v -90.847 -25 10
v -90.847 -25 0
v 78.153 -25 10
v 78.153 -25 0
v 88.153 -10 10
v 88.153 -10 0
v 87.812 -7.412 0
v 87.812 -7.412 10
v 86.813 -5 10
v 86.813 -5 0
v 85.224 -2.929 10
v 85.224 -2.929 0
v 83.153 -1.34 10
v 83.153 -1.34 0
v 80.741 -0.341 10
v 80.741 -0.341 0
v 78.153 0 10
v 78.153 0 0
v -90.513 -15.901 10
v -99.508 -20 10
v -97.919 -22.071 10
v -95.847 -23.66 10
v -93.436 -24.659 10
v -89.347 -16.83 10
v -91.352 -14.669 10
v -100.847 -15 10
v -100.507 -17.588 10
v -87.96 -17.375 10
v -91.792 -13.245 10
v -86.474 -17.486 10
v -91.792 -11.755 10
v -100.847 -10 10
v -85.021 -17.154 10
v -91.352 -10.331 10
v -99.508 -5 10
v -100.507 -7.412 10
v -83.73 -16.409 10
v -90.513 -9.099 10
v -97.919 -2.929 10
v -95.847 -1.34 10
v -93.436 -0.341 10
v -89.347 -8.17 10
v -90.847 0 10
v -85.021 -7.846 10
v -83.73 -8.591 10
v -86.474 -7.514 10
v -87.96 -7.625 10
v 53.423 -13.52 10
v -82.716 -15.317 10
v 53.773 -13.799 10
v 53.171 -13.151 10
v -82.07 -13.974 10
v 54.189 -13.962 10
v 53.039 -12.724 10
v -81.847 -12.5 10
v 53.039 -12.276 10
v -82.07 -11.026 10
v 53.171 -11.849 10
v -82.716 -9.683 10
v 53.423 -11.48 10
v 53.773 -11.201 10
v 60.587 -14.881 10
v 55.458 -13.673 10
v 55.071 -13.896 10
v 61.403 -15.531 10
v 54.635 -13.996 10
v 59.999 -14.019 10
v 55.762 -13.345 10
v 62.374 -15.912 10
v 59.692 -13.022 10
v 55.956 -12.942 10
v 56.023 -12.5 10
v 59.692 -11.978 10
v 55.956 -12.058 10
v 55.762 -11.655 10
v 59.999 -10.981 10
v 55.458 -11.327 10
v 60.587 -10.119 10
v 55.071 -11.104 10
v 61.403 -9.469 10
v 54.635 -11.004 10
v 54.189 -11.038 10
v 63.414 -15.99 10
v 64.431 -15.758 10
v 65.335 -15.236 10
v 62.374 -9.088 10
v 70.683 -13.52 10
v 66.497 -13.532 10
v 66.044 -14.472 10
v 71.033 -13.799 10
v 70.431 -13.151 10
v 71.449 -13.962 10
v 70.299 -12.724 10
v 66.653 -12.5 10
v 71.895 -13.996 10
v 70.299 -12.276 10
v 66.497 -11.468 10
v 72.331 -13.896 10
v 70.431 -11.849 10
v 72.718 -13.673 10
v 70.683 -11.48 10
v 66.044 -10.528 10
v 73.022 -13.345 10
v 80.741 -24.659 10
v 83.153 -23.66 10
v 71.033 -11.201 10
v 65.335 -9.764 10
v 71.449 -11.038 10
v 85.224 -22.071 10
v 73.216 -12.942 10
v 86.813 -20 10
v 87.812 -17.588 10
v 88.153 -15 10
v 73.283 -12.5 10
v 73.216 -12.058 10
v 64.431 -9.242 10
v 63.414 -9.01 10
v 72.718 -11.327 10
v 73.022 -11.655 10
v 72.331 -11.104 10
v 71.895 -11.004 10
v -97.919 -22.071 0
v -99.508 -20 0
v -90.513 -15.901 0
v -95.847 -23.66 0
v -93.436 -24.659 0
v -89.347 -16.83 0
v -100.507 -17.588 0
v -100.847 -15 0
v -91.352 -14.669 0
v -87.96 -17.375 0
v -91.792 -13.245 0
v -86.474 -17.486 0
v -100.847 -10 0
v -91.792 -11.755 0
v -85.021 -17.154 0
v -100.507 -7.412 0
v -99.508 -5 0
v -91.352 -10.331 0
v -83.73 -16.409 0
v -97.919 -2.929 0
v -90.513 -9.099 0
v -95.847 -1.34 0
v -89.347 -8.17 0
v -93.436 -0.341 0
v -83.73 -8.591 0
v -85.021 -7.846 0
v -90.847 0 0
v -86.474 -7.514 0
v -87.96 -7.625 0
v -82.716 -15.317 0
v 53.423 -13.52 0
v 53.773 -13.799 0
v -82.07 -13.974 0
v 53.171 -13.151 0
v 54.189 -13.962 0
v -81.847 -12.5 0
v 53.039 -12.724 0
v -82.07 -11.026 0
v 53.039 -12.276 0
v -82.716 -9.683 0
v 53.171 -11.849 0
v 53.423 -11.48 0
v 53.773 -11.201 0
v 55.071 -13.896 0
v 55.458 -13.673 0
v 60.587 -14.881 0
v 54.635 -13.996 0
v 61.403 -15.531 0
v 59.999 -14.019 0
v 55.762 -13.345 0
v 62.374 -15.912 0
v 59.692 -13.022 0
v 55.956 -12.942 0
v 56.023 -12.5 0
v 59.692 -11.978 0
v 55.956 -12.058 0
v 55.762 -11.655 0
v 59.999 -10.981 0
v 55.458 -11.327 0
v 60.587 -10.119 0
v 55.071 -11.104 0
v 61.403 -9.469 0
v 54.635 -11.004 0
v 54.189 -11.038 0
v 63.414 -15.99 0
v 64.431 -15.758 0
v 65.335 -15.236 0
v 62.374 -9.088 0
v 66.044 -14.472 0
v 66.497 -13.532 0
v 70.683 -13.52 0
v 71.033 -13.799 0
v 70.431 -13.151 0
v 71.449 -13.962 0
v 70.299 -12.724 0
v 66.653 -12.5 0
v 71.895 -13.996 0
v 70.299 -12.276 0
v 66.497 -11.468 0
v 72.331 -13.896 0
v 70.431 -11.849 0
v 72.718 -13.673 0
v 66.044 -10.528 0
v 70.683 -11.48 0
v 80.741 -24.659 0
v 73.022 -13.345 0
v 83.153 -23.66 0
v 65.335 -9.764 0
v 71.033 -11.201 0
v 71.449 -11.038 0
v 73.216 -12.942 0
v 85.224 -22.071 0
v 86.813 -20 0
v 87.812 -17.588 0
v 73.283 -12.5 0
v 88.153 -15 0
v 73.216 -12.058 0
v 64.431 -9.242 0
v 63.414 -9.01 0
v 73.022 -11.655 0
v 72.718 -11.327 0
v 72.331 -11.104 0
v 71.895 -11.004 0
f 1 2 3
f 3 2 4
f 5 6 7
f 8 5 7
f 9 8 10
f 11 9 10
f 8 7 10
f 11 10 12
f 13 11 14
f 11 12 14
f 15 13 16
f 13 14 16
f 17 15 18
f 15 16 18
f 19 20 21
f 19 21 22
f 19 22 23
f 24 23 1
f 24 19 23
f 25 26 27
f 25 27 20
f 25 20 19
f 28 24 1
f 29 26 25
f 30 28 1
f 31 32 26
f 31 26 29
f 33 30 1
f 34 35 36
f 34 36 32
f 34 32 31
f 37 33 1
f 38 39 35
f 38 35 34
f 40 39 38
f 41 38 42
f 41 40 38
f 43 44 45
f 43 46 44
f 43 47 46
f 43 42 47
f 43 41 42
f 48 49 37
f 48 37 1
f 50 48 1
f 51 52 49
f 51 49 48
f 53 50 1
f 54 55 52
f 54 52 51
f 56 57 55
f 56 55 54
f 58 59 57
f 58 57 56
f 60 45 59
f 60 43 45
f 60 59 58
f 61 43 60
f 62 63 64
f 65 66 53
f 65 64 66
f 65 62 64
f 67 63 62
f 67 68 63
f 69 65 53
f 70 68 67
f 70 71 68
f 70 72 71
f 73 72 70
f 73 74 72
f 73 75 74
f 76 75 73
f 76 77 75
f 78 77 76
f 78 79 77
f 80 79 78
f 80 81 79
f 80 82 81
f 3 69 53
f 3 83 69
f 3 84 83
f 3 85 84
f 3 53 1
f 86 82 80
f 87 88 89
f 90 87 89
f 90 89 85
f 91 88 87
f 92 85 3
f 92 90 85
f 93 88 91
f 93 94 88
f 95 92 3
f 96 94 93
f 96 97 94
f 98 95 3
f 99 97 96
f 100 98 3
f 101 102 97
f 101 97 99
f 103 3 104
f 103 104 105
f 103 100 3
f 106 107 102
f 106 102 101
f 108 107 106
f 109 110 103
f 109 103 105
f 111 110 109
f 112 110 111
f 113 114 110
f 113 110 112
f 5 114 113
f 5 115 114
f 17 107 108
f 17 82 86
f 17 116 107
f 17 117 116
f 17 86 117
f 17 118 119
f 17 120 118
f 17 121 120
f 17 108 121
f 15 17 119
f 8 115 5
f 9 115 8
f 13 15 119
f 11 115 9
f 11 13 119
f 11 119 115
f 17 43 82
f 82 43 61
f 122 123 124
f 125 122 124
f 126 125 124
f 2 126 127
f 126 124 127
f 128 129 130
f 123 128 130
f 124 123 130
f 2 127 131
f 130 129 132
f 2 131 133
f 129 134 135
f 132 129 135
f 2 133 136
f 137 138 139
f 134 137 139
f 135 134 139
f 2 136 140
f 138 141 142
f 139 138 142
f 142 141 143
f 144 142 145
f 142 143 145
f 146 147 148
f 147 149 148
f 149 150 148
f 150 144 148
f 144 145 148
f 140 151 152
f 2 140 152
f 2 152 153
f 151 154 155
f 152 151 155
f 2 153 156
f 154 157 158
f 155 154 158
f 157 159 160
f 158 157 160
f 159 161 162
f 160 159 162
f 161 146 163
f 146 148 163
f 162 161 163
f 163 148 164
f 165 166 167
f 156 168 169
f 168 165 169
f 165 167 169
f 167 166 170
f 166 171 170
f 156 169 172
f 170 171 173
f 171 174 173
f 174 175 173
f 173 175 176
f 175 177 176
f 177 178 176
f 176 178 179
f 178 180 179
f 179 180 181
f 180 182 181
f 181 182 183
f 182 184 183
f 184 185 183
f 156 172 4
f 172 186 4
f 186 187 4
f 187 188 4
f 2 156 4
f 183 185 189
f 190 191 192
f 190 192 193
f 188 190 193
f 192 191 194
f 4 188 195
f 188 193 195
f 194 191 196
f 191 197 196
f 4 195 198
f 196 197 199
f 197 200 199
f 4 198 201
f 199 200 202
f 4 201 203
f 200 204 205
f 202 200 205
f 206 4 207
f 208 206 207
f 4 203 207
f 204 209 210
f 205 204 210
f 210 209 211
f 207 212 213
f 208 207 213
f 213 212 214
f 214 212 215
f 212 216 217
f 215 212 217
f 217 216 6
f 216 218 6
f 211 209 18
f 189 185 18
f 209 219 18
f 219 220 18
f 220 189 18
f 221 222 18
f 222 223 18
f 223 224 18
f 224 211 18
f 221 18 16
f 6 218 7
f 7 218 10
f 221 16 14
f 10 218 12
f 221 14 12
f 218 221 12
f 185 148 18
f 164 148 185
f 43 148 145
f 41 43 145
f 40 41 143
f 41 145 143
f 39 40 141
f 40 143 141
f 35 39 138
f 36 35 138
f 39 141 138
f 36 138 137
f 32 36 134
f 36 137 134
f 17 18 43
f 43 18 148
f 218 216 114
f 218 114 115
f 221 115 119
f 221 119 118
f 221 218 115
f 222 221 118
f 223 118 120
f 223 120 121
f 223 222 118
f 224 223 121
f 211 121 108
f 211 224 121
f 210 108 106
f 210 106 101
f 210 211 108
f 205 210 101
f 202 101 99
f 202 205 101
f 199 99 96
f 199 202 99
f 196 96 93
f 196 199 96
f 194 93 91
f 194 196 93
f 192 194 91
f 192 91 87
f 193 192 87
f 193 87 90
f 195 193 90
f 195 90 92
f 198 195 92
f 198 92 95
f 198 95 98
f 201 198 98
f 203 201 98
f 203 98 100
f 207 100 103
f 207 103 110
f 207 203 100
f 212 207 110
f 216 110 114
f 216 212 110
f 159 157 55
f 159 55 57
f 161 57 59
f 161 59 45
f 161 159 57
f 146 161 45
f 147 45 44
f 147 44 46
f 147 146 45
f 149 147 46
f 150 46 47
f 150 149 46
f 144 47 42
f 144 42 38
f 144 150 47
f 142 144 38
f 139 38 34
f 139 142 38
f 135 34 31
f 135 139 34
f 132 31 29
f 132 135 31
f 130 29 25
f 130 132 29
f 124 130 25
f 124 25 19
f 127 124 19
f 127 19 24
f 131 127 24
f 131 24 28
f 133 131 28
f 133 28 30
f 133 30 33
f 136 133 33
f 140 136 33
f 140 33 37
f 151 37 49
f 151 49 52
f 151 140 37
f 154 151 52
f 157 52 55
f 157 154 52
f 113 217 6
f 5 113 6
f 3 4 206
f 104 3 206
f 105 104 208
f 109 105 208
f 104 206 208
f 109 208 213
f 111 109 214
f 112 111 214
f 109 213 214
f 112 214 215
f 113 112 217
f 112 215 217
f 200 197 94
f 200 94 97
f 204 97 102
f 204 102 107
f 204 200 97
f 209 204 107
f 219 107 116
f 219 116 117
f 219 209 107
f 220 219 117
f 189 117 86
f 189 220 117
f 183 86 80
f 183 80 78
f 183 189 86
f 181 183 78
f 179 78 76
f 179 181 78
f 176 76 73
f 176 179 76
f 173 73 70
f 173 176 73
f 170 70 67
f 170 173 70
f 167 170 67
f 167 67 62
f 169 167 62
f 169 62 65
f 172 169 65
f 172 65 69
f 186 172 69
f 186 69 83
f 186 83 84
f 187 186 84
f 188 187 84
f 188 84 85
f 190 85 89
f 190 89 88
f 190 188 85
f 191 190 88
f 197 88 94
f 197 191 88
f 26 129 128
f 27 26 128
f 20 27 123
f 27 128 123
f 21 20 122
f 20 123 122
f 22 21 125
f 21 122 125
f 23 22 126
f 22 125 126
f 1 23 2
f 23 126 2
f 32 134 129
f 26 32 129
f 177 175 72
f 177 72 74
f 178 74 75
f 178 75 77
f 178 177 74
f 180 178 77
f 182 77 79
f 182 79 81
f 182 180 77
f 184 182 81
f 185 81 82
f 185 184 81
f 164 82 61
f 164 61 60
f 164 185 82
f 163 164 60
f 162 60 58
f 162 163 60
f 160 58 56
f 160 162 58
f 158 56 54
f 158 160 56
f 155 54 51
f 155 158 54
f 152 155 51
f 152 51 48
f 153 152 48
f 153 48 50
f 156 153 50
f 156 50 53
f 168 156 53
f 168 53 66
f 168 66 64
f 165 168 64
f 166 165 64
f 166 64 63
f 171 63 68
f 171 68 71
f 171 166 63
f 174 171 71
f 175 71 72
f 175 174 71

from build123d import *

# Parameters (mm, degrees)
SKETCH1_R           = 5
SKETCH1_R_2         = 3.5
SKETCH1_R_3         = 1.5
BOSS_EXTRUDE1_DEPTH = 10


with BuildPart() as part:
    # Sketch1 → Boss-Extrude1 (new body)
    with BuildSketch(Plane.XY):
        with BuildLine():
            Line((0, 0), (-90.847457627, 0))
            ThreePointArc((-90.847457627, 0), (-97.918525439, -2.928932188), (-100.847457627, -10))
            Line((-100.847457627, -10), (-100.847457627, -15))
            ThreePointArc((-100.847457627, -15), (-97.918525439, -22.071067812), (-90.847457627, -25))
            Line((-90.847457627, -25), (78.152542373, -25))
            ThreePointArc((78.152542373, -25), (85.223610185, -22.071067812), (88.152542373, -15))
            Line((88.152542373, -15), (88.152542373, -10))
            ThreePointArc((88.152542373, -10), (85.223610185, -2.928932188), (78.152542373, 0))
            Line((78.152542373, 0), (0, 0))
        make_face()
        with Locations((-86.847457627, -12.5)):
            Circle(SKETCH1_R, mode=Mode.SUBTRACT)
        with Locations((63.152542373, -12.5)):
            Circle(SKETCH1_R_2, mode=Mode.SUBTRACT)
        with Locations((54.522542373, -12.5)):
            Circle(SKETCH1_R_3, mode=Mode.SUBTRACT)
        with Locations((71.782542373, -12.5)):
            Circle(SKETCH1_R_3, mode=Mode.SUBTRACT)
    extrude(amount=BOSS_EXTRUDE1_DEPTH)


solid = part.part
